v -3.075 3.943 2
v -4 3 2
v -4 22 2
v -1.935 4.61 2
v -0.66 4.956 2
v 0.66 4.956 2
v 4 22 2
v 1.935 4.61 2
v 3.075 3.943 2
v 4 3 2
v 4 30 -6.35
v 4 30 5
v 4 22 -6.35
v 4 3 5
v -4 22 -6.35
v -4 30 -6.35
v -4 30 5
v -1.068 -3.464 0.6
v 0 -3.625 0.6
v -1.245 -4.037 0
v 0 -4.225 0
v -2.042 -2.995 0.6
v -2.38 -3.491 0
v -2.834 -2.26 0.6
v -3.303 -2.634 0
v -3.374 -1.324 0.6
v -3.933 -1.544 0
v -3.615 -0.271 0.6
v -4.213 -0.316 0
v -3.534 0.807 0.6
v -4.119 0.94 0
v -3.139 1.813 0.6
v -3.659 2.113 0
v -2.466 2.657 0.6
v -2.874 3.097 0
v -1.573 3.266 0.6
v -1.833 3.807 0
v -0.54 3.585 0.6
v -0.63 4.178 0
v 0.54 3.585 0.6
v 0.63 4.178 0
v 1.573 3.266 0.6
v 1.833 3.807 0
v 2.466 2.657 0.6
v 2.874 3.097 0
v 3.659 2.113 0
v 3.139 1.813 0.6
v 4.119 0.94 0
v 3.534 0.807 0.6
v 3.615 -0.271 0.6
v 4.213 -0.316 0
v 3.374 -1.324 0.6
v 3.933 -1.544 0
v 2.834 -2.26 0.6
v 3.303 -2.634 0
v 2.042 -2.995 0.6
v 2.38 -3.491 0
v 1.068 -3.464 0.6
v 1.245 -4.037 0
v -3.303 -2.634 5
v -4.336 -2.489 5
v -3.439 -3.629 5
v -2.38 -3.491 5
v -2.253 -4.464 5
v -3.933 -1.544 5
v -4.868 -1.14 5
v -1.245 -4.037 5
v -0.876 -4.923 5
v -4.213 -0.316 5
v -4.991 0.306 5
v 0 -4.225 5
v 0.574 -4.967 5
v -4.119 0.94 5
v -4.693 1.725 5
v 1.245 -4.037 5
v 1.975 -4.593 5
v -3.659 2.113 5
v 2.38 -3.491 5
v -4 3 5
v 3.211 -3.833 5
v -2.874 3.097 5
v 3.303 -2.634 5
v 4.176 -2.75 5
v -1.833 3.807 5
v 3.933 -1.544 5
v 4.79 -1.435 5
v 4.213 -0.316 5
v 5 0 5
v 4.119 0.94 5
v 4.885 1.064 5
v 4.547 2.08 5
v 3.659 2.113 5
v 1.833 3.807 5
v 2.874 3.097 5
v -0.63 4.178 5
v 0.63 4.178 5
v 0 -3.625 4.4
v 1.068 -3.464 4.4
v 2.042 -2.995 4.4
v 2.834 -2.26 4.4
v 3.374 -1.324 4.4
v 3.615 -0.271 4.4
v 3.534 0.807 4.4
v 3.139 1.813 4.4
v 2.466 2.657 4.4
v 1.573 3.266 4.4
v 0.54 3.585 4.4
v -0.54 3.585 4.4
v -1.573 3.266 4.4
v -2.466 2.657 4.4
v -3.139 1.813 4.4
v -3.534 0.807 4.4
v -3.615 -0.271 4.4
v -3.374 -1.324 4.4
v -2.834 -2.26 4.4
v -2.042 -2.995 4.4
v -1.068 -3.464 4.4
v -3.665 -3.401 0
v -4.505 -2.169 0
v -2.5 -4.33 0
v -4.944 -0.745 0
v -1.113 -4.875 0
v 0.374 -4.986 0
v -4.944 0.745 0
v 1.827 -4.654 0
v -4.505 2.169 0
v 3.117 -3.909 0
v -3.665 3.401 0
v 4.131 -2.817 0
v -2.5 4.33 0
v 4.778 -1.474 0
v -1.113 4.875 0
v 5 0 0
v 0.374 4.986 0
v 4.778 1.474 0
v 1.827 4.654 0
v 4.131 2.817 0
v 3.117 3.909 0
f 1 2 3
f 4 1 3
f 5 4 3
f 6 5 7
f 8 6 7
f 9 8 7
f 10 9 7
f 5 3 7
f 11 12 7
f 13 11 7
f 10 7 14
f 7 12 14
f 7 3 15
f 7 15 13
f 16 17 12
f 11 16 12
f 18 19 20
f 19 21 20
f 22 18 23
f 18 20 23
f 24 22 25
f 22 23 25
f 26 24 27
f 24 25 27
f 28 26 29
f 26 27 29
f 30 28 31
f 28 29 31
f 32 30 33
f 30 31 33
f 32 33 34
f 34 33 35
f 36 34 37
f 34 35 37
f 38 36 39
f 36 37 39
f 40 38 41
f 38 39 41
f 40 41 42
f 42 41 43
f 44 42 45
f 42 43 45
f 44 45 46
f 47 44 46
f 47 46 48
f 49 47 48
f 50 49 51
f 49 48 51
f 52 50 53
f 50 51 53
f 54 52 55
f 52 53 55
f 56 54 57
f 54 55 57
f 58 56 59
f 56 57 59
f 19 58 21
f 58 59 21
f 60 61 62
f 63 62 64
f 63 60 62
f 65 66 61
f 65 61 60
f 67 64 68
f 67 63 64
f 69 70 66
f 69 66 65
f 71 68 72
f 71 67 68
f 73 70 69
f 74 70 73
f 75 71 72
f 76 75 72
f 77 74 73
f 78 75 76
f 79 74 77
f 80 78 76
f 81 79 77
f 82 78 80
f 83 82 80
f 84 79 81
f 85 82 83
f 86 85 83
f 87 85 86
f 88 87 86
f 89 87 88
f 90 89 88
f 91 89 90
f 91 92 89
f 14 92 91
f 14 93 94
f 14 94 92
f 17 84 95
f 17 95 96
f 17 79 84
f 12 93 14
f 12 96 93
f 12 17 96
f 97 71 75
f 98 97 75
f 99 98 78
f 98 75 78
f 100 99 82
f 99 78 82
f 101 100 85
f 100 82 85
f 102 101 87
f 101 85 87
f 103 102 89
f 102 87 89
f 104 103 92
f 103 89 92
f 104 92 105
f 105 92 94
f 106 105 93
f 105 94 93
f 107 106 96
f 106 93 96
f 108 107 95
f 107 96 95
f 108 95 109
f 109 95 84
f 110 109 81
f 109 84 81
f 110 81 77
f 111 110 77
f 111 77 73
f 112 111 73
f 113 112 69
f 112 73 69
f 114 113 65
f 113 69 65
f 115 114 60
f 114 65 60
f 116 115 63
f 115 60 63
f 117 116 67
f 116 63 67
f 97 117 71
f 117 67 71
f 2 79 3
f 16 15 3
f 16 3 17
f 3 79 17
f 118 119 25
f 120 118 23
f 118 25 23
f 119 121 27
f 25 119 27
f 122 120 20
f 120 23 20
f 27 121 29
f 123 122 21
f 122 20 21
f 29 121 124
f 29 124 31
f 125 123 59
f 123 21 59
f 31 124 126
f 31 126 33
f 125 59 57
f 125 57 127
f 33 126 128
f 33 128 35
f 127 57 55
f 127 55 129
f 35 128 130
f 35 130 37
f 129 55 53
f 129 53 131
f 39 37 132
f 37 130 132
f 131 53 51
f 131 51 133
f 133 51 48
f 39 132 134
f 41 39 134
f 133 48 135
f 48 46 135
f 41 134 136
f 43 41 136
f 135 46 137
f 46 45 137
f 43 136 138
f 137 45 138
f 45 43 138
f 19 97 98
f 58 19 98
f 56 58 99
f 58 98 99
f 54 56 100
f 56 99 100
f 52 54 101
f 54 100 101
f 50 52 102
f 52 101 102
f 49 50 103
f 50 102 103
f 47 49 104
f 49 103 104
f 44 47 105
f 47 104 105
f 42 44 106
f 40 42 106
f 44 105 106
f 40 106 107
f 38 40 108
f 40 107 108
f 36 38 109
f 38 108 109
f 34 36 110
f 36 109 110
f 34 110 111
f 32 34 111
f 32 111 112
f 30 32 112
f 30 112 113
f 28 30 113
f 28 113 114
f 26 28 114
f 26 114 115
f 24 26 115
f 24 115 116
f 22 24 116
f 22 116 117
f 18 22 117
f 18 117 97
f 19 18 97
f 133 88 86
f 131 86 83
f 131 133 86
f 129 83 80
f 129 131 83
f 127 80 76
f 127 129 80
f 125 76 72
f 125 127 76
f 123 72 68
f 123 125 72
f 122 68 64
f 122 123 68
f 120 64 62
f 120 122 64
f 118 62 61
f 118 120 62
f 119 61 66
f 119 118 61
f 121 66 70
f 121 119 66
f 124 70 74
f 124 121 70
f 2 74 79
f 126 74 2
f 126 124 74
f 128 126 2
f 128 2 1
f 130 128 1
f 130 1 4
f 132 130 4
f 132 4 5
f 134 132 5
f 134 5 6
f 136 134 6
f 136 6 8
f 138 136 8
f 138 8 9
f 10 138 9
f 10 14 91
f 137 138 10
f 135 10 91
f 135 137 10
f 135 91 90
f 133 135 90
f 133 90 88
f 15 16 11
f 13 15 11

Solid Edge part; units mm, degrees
sketch "Sketch1" plane through (0, 0, 0) normal (0, 0, 1) x (1, 0, 0)
  circle A0 centre (0, 0) radius 2.5
  circle A1 centre (0, 0) radius 5
  dimension "D1" = 5
  dimension "D2" = 10
extrude "Protrusion1" add sketch "Sketch1" along normal blind 5
sketch "Sketch2" plane through (0, 0, 5) normal (0, 0, 1) x (1, 0, 0)
  line L0 (-4, 3) -> (4, 3)
  line L1 (4, 30) -> (4, 3)
  line L2 (-4, 30) -> (4, 30)
  line L3 (-4, 3) -> (-4, 30)
  dimension "D1" = 8
  dimension "D2" = 30
extrude "ExtrudedProtrusion_2" add sketch "Sketch2" against normal blind 3
sketch "Sketch3" plane through (0, 16.5, 2) normal (0, 0, -1) x (0, 1, 0)
  line L0 (13.5, 4) -> (13.5, -4)
  line L1 (13.5, -4) -> (5.5, -4)
  line L2 (5.5, -4) -> (5.5, 4)
  line L3 (5.5, 4) -> (13.5, 4)
  dimension "D1" = 8
extrude "ExtrudedProtrusion_3" add sketch "Sketch3" along normal blind 8.35
hole "Hole_1" at (0, 0, 5) direction (0, 0, -1) diameter 7.25 end up to next start chamfer 0.6 start chamfer angle 45 end chamfer 0.6 end chamfer angle 45
properties material "Polyethylene, low density"
